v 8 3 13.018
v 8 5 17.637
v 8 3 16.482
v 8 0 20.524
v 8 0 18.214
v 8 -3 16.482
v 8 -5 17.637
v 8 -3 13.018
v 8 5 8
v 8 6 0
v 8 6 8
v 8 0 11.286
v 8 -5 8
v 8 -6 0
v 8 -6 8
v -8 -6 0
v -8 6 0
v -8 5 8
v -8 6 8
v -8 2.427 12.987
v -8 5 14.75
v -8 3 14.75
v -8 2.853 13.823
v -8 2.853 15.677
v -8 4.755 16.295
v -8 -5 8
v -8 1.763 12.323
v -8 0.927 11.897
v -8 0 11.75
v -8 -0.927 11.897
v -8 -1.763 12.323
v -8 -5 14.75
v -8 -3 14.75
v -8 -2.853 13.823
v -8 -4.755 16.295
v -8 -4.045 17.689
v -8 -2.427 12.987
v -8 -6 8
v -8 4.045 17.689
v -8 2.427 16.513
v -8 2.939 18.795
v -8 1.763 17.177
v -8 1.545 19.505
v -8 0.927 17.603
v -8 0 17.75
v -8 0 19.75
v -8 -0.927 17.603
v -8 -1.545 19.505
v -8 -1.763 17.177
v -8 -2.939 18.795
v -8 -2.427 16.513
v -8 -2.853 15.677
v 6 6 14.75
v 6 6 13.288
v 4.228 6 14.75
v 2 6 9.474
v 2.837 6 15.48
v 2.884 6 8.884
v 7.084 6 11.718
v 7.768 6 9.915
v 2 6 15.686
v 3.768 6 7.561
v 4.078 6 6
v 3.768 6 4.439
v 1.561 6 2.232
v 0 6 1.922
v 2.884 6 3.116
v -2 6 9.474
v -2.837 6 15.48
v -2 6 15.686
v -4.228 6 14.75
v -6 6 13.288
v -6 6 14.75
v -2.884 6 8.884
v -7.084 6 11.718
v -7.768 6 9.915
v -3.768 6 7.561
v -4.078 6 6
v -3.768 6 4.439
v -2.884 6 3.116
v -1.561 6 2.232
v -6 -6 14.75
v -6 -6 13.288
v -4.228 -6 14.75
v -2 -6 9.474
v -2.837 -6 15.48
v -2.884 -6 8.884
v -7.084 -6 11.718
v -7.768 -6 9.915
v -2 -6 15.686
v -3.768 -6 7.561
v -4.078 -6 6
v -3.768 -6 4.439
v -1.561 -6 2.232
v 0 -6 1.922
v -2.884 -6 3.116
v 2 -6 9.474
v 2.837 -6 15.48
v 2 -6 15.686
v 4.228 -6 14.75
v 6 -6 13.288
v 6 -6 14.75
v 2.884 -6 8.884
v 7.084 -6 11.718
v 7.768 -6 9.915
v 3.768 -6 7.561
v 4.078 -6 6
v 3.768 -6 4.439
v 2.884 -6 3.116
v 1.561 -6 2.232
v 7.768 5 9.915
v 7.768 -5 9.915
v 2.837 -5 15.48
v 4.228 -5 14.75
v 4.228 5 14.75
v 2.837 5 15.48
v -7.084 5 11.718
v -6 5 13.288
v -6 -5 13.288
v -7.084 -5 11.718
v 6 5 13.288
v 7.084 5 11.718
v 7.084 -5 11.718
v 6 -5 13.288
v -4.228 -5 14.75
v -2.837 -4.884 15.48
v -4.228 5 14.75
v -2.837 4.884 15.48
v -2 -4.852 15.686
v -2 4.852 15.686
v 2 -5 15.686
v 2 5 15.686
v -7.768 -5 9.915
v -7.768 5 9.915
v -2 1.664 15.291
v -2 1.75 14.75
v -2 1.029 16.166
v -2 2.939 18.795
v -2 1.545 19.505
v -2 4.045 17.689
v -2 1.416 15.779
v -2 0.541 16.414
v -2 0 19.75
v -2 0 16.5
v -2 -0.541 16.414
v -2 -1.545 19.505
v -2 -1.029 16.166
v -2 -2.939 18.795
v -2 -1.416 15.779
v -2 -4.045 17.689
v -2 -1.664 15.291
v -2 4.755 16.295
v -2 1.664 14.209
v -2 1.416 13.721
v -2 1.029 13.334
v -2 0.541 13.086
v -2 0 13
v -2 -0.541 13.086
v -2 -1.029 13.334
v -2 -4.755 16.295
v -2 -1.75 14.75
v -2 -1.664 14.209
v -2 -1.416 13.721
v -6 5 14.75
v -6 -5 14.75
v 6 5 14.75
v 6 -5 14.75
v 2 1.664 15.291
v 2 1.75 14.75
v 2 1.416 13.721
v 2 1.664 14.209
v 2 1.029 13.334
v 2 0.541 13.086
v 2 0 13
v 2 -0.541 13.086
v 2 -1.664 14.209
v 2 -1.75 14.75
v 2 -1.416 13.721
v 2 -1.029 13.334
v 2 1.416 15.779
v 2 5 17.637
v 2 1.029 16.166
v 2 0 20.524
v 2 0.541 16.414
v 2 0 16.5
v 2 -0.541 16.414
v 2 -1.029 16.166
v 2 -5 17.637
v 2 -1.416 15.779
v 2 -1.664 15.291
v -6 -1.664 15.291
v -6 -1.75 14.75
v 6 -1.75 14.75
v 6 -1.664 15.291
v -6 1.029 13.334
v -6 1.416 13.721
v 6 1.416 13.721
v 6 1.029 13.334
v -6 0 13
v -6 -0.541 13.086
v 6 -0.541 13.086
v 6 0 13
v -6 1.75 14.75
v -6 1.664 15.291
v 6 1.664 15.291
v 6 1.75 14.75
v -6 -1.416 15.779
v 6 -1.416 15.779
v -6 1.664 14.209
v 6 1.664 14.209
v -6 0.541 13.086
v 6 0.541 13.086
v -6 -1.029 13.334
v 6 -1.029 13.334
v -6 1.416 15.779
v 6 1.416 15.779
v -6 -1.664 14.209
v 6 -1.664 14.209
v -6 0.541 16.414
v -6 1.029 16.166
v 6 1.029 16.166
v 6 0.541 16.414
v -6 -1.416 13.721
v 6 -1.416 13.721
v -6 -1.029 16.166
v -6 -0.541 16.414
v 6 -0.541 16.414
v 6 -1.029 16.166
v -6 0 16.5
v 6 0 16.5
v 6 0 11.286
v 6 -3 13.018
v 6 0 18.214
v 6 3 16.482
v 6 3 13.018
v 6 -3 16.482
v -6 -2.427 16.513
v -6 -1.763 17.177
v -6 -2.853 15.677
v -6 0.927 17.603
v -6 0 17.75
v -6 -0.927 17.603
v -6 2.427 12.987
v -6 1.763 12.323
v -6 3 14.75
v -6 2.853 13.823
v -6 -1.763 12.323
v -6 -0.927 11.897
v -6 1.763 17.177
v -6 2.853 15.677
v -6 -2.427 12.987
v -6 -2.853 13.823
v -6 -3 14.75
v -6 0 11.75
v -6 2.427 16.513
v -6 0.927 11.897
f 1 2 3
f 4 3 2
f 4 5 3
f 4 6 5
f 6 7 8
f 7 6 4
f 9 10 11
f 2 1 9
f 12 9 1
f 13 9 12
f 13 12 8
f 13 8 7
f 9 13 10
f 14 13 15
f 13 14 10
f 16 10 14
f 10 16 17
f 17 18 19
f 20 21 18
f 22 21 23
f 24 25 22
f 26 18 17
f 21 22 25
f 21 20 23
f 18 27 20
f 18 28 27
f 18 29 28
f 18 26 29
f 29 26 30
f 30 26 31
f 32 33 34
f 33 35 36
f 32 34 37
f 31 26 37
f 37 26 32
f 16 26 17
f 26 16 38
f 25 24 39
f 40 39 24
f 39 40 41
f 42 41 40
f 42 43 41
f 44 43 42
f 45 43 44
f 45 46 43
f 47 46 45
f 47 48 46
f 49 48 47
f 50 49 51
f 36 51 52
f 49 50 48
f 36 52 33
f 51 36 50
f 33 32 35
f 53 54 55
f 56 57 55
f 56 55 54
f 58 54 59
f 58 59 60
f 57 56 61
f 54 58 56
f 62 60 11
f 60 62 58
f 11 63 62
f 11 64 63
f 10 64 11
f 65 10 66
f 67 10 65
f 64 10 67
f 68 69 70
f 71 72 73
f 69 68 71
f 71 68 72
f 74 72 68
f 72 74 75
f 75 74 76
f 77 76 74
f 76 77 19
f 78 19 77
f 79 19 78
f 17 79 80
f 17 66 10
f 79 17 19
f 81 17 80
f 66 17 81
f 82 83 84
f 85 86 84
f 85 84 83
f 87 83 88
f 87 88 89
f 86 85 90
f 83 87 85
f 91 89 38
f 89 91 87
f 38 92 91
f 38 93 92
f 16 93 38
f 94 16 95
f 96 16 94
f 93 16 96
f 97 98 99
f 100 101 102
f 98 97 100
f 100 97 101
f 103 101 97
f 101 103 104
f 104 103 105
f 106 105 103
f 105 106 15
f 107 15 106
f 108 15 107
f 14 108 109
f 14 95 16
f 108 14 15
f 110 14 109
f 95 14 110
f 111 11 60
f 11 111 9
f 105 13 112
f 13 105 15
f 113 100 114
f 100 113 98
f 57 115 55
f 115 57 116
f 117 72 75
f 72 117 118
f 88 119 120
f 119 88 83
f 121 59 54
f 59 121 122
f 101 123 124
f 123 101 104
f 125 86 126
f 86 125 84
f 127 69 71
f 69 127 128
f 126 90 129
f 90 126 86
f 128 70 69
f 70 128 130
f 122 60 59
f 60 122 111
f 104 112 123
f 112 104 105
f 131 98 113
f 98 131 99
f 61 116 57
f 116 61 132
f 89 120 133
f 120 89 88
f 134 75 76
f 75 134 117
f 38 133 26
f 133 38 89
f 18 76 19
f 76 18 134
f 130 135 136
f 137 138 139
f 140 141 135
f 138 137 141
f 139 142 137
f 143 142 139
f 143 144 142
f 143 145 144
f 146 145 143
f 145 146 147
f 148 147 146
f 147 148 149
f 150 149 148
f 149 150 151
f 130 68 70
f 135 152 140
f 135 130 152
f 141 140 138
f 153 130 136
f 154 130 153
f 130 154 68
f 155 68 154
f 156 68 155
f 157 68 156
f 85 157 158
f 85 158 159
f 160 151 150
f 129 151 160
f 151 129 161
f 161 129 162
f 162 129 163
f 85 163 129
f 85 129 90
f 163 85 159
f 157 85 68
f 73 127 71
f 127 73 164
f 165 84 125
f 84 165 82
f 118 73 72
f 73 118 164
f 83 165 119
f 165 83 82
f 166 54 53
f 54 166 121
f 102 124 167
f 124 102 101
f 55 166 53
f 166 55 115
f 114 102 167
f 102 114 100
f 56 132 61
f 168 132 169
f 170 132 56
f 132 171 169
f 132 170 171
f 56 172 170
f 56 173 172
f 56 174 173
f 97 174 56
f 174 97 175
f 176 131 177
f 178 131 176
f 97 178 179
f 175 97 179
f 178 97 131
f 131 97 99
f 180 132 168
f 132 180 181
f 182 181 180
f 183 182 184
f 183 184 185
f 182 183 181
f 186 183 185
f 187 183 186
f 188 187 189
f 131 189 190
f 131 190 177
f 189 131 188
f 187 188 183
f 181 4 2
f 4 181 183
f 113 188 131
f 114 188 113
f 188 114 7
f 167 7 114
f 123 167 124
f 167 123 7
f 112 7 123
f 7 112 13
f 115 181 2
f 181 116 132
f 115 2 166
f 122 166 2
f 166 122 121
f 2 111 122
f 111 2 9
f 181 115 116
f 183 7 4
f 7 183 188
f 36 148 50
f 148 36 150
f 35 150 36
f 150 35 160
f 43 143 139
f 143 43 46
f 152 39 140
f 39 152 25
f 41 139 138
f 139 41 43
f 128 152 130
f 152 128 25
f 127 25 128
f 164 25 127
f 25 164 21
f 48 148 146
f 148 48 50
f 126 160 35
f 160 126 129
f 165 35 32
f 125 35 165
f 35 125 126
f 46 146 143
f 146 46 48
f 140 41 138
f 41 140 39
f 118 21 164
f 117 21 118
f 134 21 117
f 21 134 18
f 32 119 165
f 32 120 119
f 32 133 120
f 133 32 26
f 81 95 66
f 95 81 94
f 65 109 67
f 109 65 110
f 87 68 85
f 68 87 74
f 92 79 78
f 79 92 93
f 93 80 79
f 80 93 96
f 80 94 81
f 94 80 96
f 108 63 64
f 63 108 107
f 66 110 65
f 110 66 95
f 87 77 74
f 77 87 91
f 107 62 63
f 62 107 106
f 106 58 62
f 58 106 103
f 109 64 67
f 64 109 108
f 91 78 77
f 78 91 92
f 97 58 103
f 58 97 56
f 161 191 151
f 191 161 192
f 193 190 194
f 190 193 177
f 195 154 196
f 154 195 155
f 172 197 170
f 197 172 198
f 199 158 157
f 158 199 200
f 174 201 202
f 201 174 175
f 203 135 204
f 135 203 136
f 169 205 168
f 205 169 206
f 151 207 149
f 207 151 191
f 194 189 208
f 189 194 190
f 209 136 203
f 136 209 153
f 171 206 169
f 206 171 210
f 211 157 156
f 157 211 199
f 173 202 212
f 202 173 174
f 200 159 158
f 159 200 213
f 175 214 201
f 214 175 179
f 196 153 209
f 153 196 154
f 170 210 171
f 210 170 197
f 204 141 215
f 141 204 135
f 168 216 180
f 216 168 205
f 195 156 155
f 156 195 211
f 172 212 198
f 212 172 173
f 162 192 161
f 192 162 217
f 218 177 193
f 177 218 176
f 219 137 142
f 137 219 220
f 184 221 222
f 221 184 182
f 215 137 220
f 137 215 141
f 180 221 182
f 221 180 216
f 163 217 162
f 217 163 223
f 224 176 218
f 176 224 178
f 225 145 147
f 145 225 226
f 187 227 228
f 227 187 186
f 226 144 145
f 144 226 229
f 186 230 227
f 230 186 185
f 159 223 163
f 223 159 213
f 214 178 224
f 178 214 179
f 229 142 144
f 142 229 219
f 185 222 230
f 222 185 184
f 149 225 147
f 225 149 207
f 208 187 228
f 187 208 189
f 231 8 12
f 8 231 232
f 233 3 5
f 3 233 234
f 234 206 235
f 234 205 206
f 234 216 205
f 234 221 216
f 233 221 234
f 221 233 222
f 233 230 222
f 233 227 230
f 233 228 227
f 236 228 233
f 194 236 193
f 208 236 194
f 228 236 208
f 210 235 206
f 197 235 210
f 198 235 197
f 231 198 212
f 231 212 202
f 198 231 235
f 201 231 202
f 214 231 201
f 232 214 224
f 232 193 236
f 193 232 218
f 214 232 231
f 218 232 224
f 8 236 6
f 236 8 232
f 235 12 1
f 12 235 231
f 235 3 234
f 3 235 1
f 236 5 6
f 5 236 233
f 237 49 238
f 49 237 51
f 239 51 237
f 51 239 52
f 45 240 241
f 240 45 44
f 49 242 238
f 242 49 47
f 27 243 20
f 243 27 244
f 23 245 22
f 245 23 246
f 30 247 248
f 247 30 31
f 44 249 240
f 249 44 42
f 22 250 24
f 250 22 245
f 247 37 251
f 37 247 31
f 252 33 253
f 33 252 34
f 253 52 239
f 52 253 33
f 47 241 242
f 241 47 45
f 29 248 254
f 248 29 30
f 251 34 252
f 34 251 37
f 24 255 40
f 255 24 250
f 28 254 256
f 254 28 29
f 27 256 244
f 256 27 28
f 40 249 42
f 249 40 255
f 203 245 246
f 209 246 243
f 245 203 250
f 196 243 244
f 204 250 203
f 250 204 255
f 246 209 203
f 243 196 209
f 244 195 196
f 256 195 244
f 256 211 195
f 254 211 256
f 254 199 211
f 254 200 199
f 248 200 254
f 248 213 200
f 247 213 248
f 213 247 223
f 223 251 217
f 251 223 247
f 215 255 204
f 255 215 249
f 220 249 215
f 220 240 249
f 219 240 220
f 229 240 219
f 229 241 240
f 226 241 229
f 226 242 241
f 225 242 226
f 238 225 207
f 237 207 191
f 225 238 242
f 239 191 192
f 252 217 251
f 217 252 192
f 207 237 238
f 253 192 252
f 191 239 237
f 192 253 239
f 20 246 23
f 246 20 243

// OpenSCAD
// LM8UU holder slim v1.1
// *********************************************
// Jonas Kühling
// http://www.jonaskuehling.de
// http://www.thingiverse.com/jonaskuehling
// *********************************************
// derived from:
// http://www.thingiverse.com/thing:14942

// LM8UU/rod dimensions
LM8UU_dia = 8;
LM8UU_length = 12;
rod_dia = 2;

//screw/nut dimensions (M3) - hexagon socket head cap screw ISO 4762, hexagon nut ISO 4032
screw_thread_dia_iso = 3;
screw_head_dia_iso = 5.5;
nut_wrench_size_iso = 5.5;


// screw/nut dimensions for use (plus clearance for fitting purpose)
clearance_dia = 0.5;
screw_thread_dia = screw_thread_dia_iso + clearance_dia;
screw_head_dia = screw_head_dia_iso + clearance_dia;
nut_wrench_size = nut_wrench_size_iso + clearance_dia;
nut_dia_perimeter = (nut_wrench_size/cos(30));
nut_dia = nut_dia_perimeter;
nut_surround_thickness = 2;

// main body dimensions
body_wall_thickness = 4;
body_width = LM8UU_dia + (2*body_wall_thickness);
body_height = body_width;
body_length = LM8UU_length;
gap_width = rod_dia + 2;
screw_bushing_space = 1;
screw_elevation = LM8UU_dia + body_wall_thickness + (screw_thread_dia/2) +screw_bushing_space;

// TEST - uncomment to render in openscad:
// lm8uu_holder(1);		// WITH mountplate
 lm8uu_holder();		// WITHOUT mountplate


// nophead's polyhole module for better lm8uu-fit
module polyhole(d,h) {
    n = max(round(2 * d),3);
    rotate([0,0,180])
        cylinder(h = h, r = (d / 2) / cos (180 / n), $fn = n);
}


module mount_plate()
{
	difference()
	{
		translate([0,0,1.5])
		cube([body_width+2*screw_head_dia+4*nut_surround_thickness,screw_head_dia+2*nut_surround_thickness,3], center=true);

		for(i=[-1,1])
			translate([i*(body_width/2+nut_surround_thickness+screw_head_dia/2),0,-0.5])
				cylinder(r=screw_thread_dia/2, h=4, $fn=20);
	}
}

// main body
module lm8uu_holder(with_mountplate=false)
{
	difference()
	{
		union()
		{
			if (with_mountplate) 
			mount_plate();
	
			// body
			translate([0,0,body_height/4])
				cube([body_width,body_length,body_height/2], center=true);
			translate([0,0,(LM8UU_dia/2)+body_wall_thickness])		
				rotate([90,0,0])
					cylinder(r=(LM8UU_dia/2)+body_wall_thickness, h=LM8UU_length, center=true);
	
			// gap support
			translate([-(gap_width/2)-body_wall_thickness,-(body_length/2),body_height/2])
				cube([body_wall_thickness,LM8UU_length,(LM8UU_dia/2)+screw_bushing_space+(screw_thread_dia/2)]);
			translate([gap_width/2,-(body_length/2),body_height/2])
				cube([body_wall_thickness,LM8UU_length,(LM8UU_dia/2)+screw_bushing_space+(screw_thread_dia/2)]);
	
	
			// nut trap surround
			translate([gap_width/2,0,screw_elevation])
				rotate([0,90,0])
					cylinder(r=(((nut_wrench_size+nut_surround_thickness*2)/cos(30))/2), h=(body_width-gap_width)/2, $fn=6);
			translate([gap_width/2+(body_width-gap_width)/4,0,screw_elevation/2])
				cube([(body_width-gap_width)/2,nut_wrench_size+(nut_surround_thickness*2),screw_elevation],center=true);

			// Screw hole surround
			translate([-gap_width/2,0,screw_elevation])
				rotate([0,-90,0])
					cylinder(r=(screw_head_dia/2)+nut_surround_thickness, h=(body_width-gap_width)/2, $fn=20);
			translate([-(gap_width/2+(body_width-gap_width)/4),0,screw_elevation/2])
				cube([(body_width-gap_width)/2,screw_head_dia+(nut_surround_thickness*2),screw_elevation],center=true);
		}
	
		// bushing hole
		translate([0,0,LM8UU_dia/2+2])
			rotate([90,0,0])
//				cylinder(r=LM8UU_dia/2, h=LM8UU_length+1, center=true);
				translate([0,0,-(LM8UU_length+1)/2]) polyhole(LM8UU_dia,LM8UU_length+1);	// TESTING POLYHOLE MODULE FOR BETTER LM8UU FIT
	
		// top gap
		translate([-(gap_width/2),-(body_length/2)-1,body_height/2])
			cube([gap_width,LM8UU_length+2,(LM8UU_dia/2)+screw_bushing_space+(screw_thread_dia/2)+(nut_dia/2)+nut_surround_thickness+1]);
	
		// screw hole (one all the way through)
		translate([0,0,screw_elevation])
			rotate([0,90,0])
				cylinder(r=screw_thread_dia/2, h=body_width+3, center=true, $fn=20);
	
		// nut trap
		translate([gap_width/2+body_wall_thickness,0,screw_elevation])
			rotate([0,90,0])
				cylinder(r=nut_dia/2, h=body_width/2-gap_width/2-body_wall_thickness+1,$fn=6);
	
		// screw head hole
		translate([-(gap_width)/2-body_wall_thickness,0,screw_elevation])
			rotate([0,-90,0])
				cylinder(r=screw_head_dia/2, h=body_width/2-gap_width/2-body_wall_thickness+1,$fn=20);
	
	}
}
